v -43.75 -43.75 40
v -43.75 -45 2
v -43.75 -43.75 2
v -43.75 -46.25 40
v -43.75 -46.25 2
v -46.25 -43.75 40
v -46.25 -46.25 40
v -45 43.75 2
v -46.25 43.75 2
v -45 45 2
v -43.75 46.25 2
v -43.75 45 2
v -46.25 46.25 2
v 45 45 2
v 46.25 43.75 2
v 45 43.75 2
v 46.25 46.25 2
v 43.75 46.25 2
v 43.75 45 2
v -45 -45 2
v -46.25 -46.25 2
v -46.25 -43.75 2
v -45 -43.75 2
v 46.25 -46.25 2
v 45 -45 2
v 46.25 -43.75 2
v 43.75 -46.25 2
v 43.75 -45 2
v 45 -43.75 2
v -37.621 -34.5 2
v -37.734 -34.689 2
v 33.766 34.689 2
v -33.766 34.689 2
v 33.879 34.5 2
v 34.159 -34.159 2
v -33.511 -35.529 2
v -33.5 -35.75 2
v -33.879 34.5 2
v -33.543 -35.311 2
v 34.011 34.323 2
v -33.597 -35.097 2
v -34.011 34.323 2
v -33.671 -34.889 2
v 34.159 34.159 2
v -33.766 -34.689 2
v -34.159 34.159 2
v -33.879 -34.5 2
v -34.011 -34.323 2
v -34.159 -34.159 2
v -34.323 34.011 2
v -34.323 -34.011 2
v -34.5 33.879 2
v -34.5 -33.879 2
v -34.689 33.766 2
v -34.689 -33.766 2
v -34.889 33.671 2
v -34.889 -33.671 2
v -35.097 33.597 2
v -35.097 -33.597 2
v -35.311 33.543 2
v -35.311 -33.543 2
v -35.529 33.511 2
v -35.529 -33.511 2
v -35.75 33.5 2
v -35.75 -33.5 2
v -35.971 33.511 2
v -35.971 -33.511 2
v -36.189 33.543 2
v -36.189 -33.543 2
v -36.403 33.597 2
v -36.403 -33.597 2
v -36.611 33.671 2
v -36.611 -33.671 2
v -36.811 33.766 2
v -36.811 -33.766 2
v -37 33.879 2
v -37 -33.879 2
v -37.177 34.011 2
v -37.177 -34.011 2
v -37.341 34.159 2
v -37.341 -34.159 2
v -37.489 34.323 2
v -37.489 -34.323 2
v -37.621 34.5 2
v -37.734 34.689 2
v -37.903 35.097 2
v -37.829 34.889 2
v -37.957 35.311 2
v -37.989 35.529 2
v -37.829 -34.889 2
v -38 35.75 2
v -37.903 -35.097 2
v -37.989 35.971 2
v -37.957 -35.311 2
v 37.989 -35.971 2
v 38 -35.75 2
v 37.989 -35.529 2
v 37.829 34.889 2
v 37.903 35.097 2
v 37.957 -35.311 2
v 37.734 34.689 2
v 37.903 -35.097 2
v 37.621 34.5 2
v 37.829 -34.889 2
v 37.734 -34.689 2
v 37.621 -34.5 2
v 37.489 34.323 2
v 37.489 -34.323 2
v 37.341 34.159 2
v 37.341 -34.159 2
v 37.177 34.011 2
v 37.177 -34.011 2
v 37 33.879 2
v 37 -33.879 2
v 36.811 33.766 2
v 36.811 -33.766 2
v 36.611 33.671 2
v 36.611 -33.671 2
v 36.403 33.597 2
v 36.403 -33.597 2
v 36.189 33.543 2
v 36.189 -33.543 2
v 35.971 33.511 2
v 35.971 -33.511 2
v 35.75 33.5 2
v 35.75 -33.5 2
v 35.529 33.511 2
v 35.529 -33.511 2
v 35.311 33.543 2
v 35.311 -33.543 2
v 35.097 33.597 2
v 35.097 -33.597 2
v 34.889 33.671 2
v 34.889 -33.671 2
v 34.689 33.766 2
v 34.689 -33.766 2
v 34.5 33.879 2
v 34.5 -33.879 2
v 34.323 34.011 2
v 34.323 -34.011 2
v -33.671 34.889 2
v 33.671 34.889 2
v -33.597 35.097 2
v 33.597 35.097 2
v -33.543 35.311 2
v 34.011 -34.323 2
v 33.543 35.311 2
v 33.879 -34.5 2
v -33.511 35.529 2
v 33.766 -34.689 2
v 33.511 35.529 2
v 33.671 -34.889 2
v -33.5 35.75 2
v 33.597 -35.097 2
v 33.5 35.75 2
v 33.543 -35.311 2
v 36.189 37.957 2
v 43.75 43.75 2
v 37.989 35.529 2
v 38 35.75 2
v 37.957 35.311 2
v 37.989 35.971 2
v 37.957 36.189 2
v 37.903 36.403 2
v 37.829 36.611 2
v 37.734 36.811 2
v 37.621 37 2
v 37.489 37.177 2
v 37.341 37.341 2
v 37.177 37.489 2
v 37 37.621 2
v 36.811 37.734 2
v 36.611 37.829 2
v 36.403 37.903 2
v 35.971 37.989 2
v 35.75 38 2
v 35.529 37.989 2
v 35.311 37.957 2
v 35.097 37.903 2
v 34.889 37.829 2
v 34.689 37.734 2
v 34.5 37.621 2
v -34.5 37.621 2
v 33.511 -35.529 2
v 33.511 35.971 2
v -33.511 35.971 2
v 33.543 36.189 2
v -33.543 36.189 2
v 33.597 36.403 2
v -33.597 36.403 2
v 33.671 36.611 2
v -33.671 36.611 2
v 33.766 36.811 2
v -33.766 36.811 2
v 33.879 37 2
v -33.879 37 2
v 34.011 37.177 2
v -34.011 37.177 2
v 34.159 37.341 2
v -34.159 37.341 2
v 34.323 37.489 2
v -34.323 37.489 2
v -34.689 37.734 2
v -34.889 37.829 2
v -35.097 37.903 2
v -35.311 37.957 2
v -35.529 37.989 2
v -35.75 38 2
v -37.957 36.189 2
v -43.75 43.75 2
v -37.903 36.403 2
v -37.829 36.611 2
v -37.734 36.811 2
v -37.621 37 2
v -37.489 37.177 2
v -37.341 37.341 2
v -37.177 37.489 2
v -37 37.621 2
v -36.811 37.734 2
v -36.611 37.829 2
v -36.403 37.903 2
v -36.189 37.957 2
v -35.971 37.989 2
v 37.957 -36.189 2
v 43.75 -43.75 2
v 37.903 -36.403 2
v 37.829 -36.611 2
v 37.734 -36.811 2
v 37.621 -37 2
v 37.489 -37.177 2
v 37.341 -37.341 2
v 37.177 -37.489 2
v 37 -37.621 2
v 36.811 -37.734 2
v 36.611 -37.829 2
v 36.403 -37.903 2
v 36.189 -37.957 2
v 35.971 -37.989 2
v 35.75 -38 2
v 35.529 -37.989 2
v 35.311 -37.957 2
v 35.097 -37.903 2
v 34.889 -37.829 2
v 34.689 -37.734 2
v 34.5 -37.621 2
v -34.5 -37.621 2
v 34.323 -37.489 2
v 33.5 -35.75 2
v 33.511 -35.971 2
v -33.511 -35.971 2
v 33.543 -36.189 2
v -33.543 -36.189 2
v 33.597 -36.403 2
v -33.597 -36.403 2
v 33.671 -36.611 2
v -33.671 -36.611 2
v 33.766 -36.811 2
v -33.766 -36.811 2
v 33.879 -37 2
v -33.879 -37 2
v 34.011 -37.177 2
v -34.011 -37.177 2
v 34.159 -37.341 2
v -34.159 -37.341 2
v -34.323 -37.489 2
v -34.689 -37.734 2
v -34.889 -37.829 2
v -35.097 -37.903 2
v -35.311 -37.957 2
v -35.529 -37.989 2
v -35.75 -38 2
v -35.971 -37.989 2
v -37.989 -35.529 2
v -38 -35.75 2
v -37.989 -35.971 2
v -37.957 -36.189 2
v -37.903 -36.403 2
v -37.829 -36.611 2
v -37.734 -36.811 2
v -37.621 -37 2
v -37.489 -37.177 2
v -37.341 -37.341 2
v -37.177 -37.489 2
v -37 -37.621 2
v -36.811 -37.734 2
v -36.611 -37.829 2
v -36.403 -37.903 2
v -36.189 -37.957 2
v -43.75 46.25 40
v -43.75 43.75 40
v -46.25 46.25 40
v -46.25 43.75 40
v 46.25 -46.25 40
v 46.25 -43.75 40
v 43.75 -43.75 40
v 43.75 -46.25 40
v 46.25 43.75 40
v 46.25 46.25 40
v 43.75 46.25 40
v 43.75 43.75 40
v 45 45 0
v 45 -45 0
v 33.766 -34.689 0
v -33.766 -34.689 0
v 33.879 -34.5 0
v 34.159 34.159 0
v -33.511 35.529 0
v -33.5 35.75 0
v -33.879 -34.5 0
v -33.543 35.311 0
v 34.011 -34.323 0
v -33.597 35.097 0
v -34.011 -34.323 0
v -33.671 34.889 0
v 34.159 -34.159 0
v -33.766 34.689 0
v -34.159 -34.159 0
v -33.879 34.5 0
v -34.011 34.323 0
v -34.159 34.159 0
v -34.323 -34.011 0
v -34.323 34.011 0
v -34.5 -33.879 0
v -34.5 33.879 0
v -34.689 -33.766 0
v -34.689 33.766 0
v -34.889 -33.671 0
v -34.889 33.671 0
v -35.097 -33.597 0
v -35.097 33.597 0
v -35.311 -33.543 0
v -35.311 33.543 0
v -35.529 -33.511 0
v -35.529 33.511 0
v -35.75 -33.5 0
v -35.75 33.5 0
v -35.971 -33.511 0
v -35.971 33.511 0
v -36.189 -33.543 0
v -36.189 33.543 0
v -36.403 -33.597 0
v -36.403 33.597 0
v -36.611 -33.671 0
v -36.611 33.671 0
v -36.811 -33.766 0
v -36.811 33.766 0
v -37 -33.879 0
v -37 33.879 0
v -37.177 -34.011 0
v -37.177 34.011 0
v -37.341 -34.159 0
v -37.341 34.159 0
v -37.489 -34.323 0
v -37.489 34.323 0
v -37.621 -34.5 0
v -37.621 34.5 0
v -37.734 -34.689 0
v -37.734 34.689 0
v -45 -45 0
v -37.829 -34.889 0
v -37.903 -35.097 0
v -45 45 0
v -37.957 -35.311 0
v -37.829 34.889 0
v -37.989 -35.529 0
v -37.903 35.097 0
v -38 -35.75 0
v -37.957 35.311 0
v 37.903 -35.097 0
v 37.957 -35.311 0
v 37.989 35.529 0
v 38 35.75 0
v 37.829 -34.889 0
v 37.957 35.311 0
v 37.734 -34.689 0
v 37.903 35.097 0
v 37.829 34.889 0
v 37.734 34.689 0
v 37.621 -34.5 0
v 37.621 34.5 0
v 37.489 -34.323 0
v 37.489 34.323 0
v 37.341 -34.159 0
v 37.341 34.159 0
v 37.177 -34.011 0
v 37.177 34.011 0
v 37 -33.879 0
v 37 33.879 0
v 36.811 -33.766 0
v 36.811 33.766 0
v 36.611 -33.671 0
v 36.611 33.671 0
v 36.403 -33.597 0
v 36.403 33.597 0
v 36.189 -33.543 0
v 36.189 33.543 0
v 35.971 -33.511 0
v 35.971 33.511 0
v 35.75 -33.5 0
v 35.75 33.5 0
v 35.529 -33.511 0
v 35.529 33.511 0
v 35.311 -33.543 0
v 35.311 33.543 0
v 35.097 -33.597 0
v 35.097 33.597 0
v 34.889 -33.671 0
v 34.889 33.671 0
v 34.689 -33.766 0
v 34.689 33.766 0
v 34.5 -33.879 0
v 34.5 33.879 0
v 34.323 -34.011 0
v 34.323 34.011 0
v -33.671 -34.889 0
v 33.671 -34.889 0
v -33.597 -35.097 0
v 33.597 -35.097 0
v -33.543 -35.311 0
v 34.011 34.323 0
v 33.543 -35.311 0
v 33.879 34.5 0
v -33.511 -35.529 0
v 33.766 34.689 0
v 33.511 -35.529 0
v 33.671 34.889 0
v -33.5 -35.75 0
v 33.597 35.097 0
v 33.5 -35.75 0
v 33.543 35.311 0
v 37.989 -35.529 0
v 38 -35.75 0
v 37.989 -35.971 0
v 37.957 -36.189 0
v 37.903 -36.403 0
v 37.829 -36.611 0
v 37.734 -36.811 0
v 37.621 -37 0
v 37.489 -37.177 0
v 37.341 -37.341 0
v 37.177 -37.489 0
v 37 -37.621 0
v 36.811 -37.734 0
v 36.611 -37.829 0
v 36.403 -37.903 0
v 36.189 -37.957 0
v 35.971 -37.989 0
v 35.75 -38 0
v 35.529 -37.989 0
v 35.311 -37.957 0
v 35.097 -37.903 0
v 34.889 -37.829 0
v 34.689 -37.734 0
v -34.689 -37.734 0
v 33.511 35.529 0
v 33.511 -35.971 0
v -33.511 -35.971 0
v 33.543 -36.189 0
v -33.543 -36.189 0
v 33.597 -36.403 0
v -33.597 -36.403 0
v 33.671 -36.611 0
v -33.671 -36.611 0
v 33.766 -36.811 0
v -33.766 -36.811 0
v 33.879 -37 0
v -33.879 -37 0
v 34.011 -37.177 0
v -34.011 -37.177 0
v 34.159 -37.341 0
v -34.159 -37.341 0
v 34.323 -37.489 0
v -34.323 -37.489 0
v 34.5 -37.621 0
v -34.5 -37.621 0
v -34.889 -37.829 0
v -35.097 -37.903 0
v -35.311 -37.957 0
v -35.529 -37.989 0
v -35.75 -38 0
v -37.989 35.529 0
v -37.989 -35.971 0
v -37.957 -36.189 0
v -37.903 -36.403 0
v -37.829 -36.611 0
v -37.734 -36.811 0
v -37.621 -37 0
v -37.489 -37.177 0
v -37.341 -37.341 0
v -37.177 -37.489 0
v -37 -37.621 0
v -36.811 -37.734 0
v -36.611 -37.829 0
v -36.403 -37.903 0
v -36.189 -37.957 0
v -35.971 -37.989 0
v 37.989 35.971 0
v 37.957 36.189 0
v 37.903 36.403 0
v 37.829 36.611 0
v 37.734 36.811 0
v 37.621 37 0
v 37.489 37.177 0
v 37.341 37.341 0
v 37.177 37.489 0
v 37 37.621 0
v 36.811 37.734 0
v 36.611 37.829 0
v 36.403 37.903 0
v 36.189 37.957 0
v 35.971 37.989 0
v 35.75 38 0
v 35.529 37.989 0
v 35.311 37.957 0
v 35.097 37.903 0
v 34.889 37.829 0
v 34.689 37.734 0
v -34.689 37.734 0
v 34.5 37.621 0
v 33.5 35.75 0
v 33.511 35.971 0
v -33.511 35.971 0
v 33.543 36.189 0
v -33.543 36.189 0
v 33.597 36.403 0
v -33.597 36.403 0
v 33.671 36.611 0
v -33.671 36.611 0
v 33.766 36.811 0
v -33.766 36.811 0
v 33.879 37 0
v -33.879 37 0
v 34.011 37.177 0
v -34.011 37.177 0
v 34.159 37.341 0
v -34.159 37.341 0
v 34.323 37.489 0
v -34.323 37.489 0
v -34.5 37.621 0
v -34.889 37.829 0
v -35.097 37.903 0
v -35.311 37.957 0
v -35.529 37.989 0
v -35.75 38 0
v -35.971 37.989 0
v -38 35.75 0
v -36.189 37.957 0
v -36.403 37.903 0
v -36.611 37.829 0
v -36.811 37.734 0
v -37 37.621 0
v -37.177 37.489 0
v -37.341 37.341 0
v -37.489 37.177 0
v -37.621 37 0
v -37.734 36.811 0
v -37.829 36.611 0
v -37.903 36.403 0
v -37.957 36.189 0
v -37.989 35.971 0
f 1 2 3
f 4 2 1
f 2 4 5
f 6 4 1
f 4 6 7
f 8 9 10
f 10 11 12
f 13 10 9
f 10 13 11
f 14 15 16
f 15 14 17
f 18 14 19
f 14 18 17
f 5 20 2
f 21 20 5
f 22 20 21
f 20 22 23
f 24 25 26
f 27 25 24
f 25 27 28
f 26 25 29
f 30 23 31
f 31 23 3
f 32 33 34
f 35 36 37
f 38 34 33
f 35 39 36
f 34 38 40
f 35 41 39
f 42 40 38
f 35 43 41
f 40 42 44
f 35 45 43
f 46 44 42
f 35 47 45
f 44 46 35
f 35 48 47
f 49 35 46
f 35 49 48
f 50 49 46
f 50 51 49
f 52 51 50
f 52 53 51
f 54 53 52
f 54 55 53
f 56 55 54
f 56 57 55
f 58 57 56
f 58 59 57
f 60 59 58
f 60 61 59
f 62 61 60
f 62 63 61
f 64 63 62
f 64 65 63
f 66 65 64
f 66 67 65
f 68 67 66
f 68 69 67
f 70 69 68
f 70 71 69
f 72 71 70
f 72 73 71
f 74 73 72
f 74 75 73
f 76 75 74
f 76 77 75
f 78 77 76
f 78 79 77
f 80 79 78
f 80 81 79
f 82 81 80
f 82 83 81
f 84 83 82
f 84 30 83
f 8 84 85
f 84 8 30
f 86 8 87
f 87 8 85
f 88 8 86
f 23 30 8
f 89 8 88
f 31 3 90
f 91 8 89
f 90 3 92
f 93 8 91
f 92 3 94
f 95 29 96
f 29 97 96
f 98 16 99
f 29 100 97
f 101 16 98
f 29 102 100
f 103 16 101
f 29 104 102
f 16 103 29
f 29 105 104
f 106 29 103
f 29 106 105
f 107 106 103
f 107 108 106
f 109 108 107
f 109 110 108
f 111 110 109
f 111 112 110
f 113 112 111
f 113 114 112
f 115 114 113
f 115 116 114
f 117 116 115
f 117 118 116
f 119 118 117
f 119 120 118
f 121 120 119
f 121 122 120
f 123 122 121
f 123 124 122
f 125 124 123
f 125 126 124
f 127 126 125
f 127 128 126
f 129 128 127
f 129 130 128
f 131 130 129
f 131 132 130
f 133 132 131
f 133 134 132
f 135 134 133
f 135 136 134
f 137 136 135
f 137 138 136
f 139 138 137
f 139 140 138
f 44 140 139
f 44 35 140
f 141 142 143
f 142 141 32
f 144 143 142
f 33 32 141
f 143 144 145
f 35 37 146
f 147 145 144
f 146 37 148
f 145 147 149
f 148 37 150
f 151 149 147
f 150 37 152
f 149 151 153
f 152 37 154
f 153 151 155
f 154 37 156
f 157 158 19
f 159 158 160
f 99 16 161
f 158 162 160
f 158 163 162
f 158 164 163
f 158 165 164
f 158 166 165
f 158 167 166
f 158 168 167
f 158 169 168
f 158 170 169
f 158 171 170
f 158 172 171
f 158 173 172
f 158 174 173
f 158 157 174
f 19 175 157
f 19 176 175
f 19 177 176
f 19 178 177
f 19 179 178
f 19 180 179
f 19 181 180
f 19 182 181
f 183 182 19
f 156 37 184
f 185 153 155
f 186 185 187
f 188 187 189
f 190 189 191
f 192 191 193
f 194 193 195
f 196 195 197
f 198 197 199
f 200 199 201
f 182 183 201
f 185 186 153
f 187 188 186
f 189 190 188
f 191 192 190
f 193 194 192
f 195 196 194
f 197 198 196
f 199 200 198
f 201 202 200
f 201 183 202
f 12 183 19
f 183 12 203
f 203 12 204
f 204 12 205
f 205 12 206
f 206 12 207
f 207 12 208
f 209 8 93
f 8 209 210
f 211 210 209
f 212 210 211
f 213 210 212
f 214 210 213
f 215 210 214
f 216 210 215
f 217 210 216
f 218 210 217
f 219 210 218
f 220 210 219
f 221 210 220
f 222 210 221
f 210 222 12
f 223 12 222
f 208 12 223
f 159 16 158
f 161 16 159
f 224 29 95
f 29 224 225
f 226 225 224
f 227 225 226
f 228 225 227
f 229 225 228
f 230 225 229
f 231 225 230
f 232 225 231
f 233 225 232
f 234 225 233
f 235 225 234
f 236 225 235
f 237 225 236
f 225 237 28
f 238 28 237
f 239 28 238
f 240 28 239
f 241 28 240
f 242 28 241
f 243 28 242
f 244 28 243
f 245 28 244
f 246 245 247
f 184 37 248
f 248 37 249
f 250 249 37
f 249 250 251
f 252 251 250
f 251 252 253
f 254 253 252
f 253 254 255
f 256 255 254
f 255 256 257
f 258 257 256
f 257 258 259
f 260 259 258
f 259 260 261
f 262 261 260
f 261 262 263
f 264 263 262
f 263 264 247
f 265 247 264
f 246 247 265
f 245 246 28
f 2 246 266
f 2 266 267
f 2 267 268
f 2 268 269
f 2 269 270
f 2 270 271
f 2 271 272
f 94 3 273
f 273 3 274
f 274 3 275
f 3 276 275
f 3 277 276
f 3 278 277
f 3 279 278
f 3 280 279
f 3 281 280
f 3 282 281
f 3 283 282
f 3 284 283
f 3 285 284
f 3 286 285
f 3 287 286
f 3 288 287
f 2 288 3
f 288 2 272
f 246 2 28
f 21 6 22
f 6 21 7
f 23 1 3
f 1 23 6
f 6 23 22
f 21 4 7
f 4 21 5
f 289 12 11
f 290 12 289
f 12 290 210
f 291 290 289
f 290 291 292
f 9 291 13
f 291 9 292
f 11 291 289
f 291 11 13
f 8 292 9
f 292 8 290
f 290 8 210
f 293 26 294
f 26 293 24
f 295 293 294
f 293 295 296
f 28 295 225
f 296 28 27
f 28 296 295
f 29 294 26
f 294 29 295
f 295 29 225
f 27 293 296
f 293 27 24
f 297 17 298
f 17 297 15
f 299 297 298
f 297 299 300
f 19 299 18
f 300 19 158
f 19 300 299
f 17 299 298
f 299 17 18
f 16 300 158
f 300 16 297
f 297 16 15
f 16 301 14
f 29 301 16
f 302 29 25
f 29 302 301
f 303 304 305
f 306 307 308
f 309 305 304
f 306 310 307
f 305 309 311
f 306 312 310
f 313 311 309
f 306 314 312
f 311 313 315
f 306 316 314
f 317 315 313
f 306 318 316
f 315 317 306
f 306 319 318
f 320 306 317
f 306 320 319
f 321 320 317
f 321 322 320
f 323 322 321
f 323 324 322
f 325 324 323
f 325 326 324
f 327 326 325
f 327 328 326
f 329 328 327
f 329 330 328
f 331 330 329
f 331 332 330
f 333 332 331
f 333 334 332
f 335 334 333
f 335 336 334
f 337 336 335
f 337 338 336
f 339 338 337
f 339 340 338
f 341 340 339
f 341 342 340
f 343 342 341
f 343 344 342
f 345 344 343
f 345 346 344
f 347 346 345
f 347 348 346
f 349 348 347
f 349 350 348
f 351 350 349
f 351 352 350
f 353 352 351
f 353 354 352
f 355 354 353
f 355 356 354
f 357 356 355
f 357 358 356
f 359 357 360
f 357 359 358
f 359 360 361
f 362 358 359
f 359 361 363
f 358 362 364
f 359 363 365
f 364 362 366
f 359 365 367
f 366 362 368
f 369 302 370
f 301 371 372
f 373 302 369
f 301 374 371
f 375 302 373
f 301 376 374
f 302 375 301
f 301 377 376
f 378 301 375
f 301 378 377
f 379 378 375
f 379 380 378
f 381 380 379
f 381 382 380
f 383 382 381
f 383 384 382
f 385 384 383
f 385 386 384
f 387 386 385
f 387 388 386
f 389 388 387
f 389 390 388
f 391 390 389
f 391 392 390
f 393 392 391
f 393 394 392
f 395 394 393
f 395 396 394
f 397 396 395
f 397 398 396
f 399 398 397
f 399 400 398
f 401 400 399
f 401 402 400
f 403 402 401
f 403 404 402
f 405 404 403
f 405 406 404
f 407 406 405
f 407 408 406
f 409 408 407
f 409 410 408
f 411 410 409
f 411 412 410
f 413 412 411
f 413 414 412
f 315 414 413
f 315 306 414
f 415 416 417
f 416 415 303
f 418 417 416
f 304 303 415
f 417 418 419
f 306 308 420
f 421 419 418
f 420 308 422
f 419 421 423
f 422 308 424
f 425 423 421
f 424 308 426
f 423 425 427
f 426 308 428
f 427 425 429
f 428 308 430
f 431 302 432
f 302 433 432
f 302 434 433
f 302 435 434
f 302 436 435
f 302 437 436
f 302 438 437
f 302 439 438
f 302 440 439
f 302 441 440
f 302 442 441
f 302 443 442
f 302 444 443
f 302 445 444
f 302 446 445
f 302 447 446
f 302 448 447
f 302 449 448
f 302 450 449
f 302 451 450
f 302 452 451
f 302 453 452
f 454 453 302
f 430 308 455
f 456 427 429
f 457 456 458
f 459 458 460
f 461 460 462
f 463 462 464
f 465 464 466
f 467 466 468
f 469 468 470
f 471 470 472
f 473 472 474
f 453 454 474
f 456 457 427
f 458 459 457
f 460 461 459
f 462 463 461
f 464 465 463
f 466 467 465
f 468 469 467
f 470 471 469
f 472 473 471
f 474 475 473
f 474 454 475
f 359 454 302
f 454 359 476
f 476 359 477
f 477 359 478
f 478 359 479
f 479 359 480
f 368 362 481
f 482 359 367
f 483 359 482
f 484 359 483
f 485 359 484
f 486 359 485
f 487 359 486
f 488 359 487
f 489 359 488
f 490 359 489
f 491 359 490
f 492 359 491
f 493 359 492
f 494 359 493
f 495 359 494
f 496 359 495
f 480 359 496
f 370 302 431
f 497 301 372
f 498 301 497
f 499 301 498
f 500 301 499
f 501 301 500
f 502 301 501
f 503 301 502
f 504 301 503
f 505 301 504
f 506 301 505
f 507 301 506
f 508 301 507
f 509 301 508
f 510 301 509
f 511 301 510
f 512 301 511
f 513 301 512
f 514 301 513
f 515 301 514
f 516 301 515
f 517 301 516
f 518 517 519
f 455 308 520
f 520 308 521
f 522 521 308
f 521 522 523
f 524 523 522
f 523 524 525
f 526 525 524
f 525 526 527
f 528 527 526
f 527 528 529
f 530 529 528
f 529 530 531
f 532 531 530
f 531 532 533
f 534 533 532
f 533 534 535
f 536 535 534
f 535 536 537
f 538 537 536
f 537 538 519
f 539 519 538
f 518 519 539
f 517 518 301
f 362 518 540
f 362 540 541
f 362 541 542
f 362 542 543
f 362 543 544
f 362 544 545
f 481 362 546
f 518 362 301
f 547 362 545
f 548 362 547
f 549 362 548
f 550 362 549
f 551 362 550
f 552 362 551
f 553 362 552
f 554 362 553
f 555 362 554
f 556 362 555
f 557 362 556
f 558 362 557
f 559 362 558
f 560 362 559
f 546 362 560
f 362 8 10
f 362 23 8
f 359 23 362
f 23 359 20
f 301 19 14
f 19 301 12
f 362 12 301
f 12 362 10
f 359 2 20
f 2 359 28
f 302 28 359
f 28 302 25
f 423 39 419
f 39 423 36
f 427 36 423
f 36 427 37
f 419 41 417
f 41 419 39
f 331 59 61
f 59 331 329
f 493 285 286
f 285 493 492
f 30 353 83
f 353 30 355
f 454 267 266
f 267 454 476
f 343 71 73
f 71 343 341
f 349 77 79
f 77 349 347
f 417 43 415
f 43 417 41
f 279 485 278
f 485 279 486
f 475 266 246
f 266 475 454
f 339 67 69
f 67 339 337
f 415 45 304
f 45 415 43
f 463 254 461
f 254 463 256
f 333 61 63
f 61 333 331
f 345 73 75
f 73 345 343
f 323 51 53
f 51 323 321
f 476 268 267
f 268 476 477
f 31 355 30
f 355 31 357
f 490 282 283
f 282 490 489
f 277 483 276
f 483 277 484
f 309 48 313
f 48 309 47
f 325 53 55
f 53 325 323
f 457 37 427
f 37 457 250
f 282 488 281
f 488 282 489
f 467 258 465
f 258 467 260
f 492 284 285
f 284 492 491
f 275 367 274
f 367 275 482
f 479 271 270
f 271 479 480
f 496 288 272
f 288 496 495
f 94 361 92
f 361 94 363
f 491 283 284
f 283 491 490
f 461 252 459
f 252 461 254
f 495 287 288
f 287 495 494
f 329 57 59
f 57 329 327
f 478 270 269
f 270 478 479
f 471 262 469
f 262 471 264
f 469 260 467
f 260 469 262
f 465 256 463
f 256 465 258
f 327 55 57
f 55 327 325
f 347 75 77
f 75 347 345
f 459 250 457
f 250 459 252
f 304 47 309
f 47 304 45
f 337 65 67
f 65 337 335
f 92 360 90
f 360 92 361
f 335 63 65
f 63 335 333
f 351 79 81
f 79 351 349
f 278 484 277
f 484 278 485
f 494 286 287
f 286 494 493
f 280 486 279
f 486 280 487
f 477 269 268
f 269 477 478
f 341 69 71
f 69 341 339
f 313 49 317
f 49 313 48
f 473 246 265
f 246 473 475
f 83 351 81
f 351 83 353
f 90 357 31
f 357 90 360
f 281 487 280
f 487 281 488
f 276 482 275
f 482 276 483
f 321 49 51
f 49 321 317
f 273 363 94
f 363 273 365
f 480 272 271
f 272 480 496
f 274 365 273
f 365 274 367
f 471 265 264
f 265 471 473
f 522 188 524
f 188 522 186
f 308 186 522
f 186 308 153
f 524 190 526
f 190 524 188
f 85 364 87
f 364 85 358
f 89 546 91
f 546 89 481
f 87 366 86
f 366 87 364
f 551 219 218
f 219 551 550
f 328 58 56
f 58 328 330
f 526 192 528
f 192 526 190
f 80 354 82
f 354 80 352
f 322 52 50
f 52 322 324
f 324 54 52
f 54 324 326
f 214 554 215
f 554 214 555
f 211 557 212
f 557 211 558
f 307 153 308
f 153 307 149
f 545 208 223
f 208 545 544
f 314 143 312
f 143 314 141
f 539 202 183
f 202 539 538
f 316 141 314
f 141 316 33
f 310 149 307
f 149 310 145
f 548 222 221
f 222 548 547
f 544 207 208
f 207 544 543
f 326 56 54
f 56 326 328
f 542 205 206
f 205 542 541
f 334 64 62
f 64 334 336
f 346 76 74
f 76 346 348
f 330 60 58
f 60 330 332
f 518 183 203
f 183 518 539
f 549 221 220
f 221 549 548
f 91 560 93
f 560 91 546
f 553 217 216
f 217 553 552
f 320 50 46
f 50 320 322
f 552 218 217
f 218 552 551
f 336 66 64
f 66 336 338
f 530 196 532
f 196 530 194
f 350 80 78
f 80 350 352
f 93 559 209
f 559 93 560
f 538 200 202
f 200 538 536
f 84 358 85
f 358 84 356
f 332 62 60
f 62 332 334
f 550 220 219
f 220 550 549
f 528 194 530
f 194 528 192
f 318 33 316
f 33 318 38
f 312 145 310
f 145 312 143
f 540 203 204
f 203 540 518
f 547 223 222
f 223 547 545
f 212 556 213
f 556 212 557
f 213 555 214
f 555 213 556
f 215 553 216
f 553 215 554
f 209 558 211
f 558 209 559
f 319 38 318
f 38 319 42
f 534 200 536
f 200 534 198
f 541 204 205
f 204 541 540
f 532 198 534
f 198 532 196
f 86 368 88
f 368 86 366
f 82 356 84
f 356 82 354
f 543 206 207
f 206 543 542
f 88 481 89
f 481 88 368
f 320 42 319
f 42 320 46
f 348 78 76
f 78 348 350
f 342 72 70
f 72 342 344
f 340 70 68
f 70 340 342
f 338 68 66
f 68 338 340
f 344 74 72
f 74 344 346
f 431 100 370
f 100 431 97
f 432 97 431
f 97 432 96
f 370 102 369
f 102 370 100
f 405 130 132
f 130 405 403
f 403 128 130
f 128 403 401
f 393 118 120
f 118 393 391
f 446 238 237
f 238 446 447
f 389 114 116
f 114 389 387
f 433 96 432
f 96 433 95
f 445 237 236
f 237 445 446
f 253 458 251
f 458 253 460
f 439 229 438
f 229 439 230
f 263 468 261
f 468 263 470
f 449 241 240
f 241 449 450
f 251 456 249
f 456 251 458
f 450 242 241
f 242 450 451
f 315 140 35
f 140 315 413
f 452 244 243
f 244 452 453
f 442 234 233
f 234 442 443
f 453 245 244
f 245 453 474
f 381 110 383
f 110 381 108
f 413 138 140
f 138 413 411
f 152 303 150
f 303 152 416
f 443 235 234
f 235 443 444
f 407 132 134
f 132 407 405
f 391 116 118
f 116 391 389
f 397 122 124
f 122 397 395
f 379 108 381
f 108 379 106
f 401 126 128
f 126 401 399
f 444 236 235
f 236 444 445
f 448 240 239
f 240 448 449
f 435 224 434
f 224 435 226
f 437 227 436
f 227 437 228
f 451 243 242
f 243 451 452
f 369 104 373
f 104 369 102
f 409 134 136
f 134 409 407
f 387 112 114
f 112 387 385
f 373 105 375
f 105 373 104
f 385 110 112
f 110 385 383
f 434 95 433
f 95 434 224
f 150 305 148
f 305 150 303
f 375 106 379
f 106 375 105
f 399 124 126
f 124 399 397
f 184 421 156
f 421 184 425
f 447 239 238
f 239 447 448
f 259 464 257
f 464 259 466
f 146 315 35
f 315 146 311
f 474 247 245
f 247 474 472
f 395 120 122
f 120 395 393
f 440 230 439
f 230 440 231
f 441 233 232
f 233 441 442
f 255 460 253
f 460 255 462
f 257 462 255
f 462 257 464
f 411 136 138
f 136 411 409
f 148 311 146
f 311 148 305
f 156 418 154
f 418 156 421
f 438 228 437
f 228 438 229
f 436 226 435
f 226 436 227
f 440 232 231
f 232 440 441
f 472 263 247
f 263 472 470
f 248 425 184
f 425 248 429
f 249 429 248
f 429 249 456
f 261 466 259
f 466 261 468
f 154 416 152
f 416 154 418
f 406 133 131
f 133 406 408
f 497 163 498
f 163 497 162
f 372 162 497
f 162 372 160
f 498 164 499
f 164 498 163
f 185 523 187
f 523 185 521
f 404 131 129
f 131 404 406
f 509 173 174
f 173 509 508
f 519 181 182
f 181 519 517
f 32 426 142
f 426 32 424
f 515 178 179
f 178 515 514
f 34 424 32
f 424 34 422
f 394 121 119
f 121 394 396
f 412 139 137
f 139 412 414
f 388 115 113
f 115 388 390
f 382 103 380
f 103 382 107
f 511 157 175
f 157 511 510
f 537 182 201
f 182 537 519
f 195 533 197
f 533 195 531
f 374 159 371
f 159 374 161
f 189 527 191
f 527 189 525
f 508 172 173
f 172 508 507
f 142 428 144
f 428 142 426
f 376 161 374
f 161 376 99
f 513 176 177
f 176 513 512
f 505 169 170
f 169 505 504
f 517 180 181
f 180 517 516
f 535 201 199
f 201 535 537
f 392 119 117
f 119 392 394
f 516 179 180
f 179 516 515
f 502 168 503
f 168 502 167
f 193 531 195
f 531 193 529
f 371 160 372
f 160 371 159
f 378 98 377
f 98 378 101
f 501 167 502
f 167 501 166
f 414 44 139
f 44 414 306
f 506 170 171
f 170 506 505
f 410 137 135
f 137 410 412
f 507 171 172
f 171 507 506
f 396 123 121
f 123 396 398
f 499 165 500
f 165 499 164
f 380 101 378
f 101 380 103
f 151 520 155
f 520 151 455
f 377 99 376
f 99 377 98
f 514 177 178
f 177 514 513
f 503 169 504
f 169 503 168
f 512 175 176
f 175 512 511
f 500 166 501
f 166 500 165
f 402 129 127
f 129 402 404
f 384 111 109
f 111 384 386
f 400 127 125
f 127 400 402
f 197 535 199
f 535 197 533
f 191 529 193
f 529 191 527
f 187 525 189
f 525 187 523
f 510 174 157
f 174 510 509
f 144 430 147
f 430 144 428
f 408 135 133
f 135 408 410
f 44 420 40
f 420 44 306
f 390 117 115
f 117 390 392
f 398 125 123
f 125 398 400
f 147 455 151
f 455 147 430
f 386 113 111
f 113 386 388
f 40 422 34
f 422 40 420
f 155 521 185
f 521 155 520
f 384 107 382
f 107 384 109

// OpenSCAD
// DIY magnetic stirrer housing - print orientation (upside down)
// Units: mm

// ---------- Parameters ----------
top_thickness      = 2;     // top plate thickness (z = 0 to 2)
wall_thickness     = 2.5;   // wall thickness
box_height         = 40;    // total height of box (open at top)
outer_size         = 90;    // outer X and Y size of box
screw_hole_d       = 4.5;   // M4 screw hole diameter
screw_hole_pitch   = 71.5;  // square pattern diagonal (centre to centre)
cable_notch_w      = 12;    // cable notch width
cable_notch_depth  = 8;     // cable notch depth from open edge (z = 32 to z = 40)
eps                = 0.5;   // cutter overshoot past faces

$fn = 64;

// ---------- Model ----------
difference() {
    union() {
        // Top plate (lies on bed)
        translate([-outer_size/2, -outer_size/2, 0])
            cube([outer_size, outer_size, top_thickness]);

        // Four walls rising from plate to open top
        for (x = [-outer_size/2, outer_size/2])
            for (y = [-outer_size/2, outer_size/2])
                translate([x - wall_thickness/2, y - wall_thickness/2, top_thickness])
                    cube([wall_thickness, wall_thickness, box_height - top_thickness]);
    }

    // Four M4 screw holes through top plate, centred square pattern
    for (sx = [-1, 1], sy = [-1, 1])
        translate([sx * screw_hole_pitch/2, sy * screw_hole_pitch/2, -eps])
            cylinder(d = screw_hole_d, h = top_thickness + 2*eps);

    // Cable notch in one wall: 12 mm wide, centred along wall,
    // reaching 8 mm down from open edge (z = 32 to z = 40)
    translate([-outer_size/2 + wall_thickness/2, 0, box_height - cable_notch_depth])
        cube([cable_notch_w, outer_size/2 - wall_thickness/2 - eps, cable_notch_depth + eps]);
}
